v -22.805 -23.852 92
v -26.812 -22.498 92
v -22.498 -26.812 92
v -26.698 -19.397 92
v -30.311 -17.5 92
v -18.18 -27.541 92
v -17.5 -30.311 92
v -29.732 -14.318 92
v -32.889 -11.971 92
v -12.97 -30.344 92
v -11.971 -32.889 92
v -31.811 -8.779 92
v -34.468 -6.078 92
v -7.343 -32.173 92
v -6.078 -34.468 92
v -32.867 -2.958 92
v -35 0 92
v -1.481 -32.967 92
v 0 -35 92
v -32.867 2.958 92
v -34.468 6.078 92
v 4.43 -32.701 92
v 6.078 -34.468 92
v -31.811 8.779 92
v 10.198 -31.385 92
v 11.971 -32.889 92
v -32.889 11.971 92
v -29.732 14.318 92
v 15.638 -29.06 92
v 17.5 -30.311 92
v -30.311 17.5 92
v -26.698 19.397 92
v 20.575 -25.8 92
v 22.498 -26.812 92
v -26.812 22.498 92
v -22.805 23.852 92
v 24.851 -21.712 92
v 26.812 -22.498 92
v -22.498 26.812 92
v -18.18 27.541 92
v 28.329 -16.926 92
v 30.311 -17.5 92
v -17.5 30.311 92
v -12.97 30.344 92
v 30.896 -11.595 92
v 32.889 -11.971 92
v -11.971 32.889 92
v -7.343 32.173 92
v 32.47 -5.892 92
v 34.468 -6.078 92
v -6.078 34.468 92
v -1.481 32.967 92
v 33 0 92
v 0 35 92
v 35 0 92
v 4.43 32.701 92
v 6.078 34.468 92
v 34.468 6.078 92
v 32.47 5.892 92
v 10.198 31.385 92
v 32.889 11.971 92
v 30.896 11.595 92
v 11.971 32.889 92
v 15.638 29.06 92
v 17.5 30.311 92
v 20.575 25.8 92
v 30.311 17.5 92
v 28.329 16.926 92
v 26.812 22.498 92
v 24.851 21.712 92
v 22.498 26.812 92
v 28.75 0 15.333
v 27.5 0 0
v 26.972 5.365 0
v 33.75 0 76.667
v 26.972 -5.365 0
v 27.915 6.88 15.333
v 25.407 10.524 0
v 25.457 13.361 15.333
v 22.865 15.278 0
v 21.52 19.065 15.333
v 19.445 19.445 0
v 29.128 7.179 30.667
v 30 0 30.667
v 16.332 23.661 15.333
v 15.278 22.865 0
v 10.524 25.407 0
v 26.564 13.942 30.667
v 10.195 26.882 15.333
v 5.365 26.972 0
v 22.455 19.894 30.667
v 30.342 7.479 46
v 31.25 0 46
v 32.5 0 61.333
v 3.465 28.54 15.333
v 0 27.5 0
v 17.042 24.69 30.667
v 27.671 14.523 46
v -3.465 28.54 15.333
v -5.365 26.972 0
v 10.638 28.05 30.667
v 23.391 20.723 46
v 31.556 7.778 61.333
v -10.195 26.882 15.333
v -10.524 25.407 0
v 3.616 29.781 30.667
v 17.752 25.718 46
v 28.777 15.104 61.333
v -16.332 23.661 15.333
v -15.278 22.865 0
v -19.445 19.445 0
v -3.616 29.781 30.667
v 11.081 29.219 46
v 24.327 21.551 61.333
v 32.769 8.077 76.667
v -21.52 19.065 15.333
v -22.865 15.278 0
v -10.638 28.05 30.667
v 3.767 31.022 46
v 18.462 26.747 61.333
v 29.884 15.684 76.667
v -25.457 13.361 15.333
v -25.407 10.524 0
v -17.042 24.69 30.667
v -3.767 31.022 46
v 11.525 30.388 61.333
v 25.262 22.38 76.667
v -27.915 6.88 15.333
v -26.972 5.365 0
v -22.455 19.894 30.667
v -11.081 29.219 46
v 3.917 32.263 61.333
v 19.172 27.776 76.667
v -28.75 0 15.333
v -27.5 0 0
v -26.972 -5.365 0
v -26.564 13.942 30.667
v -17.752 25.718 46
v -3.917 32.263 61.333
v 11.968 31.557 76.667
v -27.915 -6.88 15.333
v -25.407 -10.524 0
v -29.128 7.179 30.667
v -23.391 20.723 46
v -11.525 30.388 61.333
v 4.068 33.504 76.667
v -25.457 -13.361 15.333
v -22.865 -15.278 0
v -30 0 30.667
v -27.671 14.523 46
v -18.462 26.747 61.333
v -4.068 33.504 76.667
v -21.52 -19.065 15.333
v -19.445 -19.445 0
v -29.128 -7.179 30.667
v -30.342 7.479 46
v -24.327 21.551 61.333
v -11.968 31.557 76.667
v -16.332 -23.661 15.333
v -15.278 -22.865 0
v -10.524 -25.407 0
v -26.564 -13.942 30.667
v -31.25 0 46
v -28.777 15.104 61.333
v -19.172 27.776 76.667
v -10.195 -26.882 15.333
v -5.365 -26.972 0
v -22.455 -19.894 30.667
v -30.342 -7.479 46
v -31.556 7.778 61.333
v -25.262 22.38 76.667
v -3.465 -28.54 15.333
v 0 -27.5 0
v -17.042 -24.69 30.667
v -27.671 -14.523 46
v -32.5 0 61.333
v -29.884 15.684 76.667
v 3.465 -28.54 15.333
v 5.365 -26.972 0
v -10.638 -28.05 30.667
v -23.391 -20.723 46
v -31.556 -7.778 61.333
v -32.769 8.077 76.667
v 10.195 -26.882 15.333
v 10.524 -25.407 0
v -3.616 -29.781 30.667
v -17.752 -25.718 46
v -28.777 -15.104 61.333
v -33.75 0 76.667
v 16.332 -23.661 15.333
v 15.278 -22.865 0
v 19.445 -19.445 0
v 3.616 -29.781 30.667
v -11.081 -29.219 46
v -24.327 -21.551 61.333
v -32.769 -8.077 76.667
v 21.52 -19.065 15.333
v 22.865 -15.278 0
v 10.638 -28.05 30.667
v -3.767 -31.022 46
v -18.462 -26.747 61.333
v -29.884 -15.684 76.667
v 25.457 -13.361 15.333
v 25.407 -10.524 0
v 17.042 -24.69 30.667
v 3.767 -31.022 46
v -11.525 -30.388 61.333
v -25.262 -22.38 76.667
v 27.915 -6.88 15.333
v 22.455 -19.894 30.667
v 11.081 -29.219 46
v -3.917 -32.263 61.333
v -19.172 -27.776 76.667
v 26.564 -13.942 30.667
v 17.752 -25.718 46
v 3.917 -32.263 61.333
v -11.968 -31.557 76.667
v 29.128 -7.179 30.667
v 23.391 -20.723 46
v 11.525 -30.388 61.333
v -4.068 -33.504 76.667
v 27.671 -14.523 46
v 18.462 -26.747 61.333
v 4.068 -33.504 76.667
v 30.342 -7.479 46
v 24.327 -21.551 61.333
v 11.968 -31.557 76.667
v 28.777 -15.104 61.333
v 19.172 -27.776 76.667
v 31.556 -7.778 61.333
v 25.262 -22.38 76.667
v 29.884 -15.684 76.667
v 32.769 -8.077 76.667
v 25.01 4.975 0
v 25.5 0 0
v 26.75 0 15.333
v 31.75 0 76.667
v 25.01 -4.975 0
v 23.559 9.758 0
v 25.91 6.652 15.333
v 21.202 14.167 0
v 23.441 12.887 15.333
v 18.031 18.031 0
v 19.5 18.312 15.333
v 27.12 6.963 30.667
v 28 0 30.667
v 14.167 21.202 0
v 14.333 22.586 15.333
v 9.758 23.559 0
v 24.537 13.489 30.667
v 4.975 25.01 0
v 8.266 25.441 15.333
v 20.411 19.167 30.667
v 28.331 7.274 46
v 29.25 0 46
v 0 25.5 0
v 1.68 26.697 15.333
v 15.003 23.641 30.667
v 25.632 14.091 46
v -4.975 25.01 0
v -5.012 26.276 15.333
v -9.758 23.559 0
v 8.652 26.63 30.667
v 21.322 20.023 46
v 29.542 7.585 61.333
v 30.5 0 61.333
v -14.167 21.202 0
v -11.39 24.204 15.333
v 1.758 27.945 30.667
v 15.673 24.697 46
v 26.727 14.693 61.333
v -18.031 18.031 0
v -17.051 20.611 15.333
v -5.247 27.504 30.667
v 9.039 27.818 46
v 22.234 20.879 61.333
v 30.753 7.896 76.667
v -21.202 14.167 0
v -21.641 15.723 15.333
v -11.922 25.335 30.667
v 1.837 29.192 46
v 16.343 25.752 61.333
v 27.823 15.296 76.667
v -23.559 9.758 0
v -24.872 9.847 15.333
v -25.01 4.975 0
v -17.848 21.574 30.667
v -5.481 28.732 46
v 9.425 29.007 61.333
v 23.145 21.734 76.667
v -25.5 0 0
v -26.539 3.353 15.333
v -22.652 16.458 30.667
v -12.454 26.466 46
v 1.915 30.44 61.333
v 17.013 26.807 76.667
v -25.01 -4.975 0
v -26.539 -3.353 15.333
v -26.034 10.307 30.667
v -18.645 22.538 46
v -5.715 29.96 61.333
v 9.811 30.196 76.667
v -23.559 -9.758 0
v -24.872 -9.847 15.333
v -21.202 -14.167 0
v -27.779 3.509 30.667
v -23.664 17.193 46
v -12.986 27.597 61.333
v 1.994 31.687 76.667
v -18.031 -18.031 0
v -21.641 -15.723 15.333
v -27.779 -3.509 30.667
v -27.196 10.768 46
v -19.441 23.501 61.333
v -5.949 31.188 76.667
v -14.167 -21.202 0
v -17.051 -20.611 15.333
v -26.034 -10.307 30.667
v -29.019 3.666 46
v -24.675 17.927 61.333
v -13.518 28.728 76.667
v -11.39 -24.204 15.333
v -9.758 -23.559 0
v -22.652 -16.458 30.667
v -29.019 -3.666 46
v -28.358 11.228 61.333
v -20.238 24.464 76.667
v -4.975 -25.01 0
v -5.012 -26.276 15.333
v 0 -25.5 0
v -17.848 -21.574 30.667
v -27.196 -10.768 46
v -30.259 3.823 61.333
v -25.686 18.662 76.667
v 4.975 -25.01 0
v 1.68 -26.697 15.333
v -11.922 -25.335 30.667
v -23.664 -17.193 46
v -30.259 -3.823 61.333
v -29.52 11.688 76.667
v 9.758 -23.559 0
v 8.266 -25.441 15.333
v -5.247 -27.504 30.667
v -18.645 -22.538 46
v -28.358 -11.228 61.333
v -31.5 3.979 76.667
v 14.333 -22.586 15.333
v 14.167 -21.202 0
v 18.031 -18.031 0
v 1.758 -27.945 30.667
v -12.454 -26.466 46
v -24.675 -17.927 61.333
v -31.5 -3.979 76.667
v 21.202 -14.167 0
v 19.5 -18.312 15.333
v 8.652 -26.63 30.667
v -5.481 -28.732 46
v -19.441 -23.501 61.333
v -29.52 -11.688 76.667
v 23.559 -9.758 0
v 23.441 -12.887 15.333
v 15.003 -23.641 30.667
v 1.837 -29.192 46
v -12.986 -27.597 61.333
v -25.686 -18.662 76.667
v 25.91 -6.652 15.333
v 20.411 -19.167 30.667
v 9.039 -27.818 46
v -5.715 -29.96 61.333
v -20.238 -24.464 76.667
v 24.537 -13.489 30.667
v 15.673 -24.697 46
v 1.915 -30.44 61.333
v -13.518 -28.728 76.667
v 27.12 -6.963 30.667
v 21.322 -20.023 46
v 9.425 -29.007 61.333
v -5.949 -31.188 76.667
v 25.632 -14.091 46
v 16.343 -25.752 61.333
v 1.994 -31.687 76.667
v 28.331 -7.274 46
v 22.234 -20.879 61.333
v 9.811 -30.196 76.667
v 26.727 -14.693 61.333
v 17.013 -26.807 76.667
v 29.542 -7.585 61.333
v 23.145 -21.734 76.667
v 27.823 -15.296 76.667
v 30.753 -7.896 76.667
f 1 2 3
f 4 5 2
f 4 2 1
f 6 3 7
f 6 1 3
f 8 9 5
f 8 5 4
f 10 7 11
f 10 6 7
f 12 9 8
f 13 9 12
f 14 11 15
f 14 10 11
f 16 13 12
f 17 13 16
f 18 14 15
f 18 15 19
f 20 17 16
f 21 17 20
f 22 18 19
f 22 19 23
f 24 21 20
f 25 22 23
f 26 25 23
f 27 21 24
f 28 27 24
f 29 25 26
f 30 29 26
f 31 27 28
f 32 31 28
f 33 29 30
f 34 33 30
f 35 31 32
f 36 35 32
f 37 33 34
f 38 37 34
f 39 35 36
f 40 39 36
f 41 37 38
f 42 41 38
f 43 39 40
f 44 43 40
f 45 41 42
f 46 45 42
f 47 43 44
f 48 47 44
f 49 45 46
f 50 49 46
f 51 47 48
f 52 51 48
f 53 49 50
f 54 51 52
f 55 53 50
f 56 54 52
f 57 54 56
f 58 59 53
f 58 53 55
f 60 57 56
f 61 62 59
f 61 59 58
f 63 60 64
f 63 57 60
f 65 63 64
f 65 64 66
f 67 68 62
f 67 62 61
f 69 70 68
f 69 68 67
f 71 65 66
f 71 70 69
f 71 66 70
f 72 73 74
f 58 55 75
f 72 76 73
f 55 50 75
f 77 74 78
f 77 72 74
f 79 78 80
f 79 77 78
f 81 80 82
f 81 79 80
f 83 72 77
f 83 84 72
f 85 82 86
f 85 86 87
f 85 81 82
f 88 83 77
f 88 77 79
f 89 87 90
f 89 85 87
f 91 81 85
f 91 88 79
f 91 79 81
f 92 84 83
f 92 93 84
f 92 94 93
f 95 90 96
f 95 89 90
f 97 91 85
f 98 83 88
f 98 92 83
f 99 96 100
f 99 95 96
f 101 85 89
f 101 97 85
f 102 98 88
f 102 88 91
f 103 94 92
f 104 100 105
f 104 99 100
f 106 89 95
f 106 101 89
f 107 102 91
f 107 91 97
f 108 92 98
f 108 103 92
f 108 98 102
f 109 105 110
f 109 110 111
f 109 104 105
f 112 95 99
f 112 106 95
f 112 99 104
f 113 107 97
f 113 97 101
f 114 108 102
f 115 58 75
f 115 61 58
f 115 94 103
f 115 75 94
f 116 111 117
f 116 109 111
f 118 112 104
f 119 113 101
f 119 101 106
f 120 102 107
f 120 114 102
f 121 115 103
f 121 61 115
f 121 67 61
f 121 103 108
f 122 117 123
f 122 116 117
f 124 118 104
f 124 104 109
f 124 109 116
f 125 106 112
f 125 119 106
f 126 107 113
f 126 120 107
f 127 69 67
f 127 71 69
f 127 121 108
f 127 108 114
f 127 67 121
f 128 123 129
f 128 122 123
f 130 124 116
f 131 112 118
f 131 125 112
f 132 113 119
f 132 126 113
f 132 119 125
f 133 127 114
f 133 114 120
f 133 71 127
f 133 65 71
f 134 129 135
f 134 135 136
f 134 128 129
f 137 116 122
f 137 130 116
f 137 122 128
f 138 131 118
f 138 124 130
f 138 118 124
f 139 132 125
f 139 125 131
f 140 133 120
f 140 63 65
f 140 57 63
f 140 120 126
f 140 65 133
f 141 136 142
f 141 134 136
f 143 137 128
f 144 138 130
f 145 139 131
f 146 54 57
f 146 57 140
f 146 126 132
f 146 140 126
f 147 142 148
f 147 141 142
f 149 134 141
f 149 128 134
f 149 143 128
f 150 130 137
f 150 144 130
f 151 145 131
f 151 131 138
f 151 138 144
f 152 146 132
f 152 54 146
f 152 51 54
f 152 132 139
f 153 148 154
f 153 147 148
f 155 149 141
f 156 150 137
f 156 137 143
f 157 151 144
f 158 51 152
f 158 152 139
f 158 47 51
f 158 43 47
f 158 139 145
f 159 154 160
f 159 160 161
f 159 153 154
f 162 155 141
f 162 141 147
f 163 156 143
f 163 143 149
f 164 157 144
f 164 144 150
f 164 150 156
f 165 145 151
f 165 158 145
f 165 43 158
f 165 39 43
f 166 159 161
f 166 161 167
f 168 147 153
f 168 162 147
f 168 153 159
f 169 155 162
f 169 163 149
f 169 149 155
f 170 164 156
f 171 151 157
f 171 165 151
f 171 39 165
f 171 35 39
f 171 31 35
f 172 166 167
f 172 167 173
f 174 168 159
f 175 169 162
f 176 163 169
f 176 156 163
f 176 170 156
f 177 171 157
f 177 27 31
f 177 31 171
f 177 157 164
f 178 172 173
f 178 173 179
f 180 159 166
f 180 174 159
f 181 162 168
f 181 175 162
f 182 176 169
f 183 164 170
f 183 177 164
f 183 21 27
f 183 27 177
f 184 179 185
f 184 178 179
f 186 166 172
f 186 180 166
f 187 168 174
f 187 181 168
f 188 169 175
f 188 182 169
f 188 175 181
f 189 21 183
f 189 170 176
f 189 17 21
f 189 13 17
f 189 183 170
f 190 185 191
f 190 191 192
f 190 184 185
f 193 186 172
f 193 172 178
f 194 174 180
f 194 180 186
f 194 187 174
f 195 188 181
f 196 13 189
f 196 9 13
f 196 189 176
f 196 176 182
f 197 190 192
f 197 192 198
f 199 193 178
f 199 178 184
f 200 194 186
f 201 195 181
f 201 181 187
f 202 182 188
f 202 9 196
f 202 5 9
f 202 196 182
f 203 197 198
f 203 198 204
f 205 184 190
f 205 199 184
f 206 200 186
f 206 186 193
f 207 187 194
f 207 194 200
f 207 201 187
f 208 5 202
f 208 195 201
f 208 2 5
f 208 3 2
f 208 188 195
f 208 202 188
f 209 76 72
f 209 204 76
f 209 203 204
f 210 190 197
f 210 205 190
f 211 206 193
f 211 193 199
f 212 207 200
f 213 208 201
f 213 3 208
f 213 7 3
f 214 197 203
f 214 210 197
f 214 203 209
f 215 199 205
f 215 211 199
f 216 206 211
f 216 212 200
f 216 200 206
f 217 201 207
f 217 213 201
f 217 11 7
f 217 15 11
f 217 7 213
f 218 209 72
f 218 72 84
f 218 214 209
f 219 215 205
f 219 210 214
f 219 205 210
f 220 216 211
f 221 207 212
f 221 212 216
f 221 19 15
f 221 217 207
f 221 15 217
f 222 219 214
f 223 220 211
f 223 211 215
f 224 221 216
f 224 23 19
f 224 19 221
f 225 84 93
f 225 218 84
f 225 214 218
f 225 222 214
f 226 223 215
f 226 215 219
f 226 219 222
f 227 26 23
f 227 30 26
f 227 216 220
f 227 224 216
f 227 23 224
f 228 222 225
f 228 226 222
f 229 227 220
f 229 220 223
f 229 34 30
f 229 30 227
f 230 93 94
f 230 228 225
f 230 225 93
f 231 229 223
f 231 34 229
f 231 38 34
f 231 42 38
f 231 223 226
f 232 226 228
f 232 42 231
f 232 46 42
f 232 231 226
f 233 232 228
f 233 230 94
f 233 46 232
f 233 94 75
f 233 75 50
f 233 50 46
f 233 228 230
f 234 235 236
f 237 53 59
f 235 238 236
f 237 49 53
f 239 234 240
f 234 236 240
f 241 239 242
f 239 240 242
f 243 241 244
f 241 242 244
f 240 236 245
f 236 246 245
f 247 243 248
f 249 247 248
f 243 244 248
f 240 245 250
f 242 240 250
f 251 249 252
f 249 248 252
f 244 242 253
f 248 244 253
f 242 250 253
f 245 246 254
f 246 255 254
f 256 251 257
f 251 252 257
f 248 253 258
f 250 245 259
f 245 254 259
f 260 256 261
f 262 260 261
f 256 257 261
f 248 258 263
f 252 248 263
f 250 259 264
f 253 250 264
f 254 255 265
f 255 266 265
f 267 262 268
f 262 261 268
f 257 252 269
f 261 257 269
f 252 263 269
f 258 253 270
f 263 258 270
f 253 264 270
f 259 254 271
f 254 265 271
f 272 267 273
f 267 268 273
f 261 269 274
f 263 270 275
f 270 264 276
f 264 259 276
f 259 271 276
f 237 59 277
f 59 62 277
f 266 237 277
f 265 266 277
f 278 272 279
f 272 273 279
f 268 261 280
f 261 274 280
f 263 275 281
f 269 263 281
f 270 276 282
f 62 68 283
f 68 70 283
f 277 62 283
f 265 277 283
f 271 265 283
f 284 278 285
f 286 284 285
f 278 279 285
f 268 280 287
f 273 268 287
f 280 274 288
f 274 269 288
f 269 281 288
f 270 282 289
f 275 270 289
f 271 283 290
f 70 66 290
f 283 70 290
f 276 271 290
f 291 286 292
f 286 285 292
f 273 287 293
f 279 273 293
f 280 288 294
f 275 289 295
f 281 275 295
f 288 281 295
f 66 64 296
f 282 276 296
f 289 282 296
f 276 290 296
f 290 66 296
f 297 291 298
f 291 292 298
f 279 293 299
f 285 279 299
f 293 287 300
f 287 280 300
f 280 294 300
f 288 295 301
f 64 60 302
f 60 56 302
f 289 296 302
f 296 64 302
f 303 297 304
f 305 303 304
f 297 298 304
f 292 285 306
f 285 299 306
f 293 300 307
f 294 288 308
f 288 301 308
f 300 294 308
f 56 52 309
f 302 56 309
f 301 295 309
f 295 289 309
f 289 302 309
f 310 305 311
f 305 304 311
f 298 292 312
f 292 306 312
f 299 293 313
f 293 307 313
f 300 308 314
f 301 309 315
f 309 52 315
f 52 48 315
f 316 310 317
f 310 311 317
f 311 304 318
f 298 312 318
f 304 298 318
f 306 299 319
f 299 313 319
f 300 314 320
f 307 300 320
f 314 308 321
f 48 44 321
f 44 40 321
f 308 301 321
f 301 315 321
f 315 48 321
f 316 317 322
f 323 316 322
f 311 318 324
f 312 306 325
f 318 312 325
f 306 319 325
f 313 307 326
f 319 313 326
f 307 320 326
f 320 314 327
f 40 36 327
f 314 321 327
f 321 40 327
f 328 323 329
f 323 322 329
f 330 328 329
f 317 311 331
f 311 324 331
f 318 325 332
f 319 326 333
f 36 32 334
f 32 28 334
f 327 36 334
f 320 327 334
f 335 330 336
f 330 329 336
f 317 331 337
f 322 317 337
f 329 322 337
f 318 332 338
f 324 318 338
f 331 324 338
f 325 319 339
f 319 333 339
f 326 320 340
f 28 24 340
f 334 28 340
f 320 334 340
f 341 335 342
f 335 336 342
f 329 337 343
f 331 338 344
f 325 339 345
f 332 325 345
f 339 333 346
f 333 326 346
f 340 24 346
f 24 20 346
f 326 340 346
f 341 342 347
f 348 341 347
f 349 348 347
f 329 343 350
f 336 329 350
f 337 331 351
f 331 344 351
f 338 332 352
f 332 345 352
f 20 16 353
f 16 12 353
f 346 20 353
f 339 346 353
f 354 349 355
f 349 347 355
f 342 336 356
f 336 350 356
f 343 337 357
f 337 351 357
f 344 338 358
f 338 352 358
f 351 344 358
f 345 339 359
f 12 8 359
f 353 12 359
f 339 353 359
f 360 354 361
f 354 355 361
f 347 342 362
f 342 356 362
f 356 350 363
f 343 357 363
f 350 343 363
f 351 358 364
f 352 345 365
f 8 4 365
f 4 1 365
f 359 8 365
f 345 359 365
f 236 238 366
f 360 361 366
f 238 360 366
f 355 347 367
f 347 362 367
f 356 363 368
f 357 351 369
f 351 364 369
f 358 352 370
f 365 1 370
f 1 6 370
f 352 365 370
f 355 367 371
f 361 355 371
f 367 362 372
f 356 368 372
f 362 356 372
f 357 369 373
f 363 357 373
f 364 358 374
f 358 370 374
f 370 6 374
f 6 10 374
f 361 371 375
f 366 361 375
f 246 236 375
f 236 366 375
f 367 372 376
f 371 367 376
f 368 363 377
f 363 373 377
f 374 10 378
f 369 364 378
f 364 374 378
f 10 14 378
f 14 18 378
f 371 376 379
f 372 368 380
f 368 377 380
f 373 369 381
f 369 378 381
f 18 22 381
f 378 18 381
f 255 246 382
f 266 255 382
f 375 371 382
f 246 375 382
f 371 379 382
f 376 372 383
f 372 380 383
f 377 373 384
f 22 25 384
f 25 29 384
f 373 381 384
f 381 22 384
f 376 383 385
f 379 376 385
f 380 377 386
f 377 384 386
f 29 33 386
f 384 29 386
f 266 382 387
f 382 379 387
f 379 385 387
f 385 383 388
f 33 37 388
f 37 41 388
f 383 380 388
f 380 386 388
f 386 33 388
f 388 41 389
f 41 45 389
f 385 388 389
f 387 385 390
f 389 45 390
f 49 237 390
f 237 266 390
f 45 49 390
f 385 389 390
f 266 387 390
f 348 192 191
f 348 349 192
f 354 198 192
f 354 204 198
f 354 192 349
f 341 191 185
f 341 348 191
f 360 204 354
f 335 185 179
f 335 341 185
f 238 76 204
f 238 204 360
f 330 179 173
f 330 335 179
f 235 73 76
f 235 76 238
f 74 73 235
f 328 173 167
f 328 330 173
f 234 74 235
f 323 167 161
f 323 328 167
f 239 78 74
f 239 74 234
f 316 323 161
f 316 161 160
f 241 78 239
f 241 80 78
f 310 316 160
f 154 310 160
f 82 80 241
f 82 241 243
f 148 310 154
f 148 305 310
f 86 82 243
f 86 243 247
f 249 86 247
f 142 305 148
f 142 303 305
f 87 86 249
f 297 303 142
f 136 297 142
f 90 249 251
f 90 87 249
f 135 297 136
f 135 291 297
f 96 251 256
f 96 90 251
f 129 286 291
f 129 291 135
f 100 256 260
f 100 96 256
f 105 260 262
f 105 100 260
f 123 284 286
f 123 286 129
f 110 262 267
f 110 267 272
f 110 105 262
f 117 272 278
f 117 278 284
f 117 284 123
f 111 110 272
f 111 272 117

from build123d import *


with BuildPart() as cone006:
    # Cone006 → Cone006 (revolve)
    with BuildSketch(Plane.XZ):
        Polygon((0, 0), (25.5, 0), (33, 92), (0, 92), align=None)
    revolve(axis=Axis((0, 0, 0), (0, 0, 1)))


with BuildPart() as cut006:
    # Cone005 → Cone005 (revolve)
    with BuildSketch(Plane.XZ):
        Polygon((0, 0), (27.5, 0), (35, 92), (0, 92), align=None)
    revolve(axis=Axis((0, 0, 0), (0, 0, 1)))

    # Cut006: cut Cone006
    add(cone006.part, mode=Mode.SUBTRACT)


solid = cut006.part
